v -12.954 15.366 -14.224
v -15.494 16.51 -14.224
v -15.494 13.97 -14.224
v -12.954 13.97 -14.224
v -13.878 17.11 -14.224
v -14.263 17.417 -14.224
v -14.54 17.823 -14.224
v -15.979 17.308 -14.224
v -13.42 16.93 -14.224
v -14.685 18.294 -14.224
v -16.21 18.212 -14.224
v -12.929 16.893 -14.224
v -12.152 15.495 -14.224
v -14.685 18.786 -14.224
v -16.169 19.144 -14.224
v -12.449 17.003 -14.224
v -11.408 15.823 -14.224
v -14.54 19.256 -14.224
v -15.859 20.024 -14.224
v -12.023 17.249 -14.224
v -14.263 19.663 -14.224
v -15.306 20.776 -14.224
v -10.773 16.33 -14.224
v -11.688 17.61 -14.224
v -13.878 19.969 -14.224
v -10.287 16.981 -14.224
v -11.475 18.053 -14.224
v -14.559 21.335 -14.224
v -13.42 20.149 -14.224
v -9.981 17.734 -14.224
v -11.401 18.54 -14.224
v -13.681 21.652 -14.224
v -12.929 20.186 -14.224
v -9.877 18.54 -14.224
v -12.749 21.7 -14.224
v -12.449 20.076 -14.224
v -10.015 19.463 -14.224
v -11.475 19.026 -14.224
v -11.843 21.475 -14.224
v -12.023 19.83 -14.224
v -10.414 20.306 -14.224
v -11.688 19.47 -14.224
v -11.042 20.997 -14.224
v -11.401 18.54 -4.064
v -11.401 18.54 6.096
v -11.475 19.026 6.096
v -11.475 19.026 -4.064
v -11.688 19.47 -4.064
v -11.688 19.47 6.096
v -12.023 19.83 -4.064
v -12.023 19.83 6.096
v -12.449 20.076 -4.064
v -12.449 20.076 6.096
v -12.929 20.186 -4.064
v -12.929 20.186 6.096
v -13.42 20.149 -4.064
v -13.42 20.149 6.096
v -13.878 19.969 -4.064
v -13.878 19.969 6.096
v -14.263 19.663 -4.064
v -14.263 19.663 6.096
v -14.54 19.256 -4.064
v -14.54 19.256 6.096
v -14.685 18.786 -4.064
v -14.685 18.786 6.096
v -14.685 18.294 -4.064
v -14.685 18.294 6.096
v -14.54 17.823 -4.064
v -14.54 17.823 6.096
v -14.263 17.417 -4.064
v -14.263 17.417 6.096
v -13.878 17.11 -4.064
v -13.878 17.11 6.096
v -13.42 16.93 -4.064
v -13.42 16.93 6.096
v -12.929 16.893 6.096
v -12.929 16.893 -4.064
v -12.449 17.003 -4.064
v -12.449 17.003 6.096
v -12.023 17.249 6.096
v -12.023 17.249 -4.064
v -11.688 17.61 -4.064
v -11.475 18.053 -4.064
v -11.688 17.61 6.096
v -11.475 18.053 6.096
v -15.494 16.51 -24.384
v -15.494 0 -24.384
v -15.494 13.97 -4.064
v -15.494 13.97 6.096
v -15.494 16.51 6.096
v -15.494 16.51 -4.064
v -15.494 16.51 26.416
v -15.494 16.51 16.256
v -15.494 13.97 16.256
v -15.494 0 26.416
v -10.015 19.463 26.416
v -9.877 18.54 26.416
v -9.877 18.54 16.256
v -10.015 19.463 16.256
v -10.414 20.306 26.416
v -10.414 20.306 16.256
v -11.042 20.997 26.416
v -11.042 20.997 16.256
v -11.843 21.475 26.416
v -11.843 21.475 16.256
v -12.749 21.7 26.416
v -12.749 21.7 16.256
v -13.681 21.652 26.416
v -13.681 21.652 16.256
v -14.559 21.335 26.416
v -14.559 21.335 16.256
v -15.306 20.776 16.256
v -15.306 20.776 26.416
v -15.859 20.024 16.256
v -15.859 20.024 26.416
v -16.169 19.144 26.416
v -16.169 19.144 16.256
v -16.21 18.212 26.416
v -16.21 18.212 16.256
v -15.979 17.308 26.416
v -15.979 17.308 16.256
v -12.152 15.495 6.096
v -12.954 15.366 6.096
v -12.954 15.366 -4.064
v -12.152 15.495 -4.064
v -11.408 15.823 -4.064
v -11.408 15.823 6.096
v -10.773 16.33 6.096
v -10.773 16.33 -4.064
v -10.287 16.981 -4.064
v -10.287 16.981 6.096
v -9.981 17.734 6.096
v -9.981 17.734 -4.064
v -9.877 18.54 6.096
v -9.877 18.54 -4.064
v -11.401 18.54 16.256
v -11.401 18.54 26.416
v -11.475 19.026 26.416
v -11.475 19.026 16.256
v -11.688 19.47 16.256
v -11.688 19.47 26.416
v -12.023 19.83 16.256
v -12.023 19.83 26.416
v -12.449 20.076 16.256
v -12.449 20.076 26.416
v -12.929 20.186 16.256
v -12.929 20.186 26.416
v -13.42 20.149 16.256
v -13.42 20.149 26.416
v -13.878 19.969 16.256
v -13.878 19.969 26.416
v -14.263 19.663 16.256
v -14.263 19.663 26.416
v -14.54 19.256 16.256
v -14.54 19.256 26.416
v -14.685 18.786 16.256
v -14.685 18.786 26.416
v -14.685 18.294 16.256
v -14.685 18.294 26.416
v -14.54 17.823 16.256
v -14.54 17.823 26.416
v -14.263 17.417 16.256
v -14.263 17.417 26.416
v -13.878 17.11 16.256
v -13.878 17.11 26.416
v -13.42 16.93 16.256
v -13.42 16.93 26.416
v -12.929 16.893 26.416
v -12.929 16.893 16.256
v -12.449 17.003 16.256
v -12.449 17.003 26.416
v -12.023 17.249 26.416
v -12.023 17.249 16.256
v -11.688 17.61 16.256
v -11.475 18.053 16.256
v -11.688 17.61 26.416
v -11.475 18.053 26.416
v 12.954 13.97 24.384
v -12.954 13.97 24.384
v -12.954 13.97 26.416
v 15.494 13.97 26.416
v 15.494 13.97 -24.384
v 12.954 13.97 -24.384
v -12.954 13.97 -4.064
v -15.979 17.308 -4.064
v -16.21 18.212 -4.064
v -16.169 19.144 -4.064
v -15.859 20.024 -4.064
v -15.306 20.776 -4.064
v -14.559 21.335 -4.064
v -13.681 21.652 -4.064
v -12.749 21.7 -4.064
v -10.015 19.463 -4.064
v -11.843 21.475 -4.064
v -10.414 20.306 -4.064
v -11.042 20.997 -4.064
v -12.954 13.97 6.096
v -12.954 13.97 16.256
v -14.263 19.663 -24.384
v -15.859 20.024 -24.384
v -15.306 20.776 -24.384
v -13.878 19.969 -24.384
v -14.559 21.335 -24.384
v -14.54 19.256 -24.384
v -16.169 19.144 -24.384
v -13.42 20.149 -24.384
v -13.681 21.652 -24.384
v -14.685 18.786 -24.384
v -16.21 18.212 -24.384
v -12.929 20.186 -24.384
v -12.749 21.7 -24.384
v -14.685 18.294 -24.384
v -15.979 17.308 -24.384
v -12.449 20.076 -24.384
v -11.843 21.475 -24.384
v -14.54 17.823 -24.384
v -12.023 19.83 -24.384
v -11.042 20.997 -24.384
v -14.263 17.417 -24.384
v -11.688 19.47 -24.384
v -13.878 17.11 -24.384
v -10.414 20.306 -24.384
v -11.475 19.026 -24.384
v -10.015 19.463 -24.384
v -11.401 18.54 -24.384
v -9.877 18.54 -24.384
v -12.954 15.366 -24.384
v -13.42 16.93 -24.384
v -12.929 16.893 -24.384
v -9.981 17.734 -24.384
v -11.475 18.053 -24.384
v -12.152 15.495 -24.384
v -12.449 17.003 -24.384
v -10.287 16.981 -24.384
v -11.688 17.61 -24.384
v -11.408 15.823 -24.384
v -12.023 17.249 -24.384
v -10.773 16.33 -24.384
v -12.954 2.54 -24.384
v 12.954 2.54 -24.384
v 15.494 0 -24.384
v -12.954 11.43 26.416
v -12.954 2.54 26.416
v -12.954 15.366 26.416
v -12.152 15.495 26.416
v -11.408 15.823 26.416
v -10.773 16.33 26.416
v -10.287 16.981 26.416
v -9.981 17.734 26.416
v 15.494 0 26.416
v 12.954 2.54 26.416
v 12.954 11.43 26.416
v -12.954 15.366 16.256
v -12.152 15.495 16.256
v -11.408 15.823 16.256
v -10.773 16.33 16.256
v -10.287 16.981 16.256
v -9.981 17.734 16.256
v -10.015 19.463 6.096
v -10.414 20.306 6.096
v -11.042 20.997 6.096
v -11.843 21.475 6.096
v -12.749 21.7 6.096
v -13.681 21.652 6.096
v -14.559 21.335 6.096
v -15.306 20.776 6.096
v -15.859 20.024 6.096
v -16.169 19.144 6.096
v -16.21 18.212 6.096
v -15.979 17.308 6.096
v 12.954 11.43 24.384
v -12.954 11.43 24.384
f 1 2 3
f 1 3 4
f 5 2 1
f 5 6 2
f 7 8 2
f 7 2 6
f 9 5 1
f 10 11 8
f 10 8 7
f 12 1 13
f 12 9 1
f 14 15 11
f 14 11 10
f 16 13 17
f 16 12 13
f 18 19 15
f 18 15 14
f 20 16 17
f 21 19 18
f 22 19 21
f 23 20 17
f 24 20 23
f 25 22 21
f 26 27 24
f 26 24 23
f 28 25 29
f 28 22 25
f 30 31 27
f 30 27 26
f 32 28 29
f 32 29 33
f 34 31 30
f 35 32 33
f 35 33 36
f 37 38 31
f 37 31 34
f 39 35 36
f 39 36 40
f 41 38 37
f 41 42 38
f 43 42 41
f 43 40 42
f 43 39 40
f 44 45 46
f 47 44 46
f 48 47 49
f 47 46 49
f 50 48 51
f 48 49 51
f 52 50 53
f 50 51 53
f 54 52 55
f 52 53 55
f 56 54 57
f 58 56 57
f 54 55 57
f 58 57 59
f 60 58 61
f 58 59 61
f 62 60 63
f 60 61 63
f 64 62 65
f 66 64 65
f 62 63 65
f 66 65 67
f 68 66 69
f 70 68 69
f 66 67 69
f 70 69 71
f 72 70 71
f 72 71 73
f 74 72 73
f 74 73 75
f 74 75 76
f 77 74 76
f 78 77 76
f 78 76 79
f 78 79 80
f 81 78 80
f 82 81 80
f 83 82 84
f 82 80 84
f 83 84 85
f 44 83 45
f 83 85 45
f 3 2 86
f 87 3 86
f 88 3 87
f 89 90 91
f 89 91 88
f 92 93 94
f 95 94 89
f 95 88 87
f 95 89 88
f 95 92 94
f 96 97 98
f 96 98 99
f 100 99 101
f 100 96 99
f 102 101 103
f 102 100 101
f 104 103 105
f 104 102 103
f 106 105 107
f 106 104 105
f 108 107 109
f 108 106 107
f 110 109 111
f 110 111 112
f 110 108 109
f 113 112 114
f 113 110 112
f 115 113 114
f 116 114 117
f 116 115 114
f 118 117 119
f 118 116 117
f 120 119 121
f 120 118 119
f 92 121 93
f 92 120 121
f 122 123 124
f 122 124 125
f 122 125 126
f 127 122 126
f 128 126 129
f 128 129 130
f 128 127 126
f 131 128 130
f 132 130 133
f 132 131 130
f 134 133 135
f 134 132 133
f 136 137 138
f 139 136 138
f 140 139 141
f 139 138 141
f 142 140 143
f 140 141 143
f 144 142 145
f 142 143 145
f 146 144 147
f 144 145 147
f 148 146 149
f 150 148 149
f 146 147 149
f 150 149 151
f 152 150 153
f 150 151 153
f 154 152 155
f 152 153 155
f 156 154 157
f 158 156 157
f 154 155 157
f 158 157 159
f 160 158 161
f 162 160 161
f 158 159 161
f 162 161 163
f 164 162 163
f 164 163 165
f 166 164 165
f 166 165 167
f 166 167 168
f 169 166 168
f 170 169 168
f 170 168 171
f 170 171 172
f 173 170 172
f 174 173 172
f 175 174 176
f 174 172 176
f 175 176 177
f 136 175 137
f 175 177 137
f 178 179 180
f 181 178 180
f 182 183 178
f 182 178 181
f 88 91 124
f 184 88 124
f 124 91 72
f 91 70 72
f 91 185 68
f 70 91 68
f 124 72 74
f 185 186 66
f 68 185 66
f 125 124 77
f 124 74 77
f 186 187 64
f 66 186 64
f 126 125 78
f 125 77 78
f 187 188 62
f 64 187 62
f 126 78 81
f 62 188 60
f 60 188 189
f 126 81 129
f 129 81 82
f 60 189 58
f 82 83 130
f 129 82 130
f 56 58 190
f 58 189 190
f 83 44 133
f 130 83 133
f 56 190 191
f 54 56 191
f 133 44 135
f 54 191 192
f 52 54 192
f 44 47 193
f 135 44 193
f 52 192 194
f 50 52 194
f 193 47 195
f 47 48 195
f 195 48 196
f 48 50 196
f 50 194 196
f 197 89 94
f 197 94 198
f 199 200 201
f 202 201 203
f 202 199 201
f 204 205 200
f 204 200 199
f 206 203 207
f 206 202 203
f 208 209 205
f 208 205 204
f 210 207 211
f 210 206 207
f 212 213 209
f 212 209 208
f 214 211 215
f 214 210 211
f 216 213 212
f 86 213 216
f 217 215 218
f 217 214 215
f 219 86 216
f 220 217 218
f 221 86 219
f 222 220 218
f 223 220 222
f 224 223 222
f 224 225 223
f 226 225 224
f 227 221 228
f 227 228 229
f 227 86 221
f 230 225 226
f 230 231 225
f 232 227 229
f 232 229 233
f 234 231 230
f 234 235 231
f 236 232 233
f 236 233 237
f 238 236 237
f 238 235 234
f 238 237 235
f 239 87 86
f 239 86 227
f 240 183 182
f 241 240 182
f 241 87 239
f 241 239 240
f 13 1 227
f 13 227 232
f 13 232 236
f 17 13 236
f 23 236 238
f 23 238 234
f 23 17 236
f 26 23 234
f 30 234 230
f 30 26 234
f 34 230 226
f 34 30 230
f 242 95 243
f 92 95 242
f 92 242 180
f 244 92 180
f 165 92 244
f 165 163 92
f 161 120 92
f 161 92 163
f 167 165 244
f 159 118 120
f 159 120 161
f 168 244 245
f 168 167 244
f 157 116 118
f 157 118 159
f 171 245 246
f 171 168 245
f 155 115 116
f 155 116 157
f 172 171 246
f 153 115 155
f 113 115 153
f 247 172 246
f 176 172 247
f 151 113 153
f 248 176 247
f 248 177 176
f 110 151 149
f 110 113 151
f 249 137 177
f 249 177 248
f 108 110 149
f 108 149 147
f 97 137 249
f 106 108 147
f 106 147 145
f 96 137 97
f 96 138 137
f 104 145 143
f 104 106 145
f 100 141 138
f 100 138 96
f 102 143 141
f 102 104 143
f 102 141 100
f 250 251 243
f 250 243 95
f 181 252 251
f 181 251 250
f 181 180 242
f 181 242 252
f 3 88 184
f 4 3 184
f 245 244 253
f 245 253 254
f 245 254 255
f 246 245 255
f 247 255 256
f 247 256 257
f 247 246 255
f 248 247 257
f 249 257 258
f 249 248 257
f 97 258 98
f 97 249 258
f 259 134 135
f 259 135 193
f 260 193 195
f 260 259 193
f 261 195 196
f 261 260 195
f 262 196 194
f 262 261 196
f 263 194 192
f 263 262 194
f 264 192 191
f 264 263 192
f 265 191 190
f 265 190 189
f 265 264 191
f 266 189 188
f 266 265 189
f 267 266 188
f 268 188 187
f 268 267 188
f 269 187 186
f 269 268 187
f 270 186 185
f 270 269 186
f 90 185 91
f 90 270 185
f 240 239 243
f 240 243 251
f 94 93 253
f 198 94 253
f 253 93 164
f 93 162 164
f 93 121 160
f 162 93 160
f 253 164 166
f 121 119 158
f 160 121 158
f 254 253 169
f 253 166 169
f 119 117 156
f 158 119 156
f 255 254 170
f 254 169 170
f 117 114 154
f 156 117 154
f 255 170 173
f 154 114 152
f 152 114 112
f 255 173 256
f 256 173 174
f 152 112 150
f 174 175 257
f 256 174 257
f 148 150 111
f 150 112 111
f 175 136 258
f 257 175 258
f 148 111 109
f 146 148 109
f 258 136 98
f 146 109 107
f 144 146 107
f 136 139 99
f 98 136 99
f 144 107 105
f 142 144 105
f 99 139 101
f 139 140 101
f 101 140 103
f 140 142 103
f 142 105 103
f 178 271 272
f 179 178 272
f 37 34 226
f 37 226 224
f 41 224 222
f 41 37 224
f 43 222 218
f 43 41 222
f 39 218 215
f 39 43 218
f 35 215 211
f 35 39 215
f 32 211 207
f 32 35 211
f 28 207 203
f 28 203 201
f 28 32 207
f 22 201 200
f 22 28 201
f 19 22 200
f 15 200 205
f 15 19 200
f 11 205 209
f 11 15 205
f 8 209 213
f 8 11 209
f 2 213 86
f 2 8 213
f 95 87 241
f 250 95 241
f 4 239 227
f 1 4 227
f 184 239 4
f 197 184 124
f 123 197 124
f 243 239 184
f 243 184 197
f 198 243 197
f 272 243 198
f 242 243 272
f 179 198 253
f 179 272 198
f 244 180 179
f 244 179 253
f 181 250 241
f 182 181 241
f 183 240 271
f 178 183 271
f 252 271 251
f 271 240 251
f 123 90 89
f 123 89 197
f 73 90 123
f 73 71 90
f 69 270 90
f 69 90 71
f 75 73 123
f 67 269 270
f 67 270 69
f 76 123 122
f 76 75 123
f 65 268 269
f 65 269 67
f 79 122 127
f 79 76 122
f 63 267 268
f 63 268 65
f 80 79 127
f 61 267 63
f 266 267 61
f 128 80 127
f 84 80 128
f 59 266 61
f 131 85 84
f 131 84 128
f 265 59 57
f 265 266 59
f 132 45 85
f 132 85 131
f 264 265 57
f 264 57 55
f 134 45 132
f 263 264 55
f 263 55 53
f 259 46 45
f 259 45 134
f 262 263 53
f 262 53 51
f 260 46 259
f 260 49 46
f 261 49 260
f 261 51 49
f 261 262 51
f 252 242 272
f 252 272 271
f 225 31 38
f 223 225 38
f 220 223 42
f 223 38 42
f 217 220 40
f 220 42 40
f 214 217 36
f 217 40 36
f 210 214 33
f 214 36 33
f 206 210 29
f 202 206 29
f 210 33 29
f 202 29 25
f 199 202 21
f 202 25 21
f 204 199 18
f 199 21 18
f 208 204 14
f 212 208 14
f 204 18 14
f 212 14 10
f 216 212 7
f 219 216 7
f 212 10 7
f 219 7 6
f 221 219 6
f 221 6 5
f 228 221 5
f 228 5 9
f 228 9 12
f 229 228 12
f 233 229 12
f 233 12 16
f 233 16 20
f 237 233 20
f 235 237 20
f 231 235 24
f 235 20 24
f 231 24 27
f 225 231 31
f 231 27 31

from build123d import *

# Parameters (mm, degrees)
BATTERY_WALL_DEPTH  = 13.97
SKETCH1_4_W         = 25.908
SKETCH1_4_H         = 48.768
BATTERY_BASE_DEPTH  = 2.54
SKETCH3_W           = 25.908
SKETCH3_H           = 8.89
BATTERY_GAP_DEPTH   = 2.54
SKETCH4_R           = 1.651
BATTERY_HINGE_DEPTH = 10.16
LPATTERN1_COUNT     = 3
LPATTERN1_PITCH     = 20.32


with BuildPart() as part:
    # Sketch1 → battery-wall (new body)
    with BuildSketch(Plane(origin=(0, 0, 0), x_dir=(1, 0, 0), z_dir=(0, 1, 0))):
        Polygon((-12.954, -24.384), (-12.954, 24.384), (-15.494, 24.384), (-15.494, -26.416), (15.494, -26.416), (15.494, 24.384), (12.954, 24.384), (12.954, -24.384), align=None)
    extrude(amount=BATTERY_WALL_DEPTH)

    # Sketch1<4> → battery-base (add)
    with BuildSketch(Plane(origin=(0, 0, 0), x_dir=(1, 0, 0), z_dir=(0, 1, 0))):
        Rectangle(SKETCH1_4_W, SKETCH1_4_H)
    extrude(amount=BATTERY_BASE_DEPTH)

    # Sketch3 → battery-gap (cut)
    with BuildSketch(Plane.XY.offset(26.416)):
        with Locations((0, 6.985)):
            Rectangle(SKETCH3_W, SKETCH3_H)
    extrude(amount=-BATTERY_GAP_DEPTH, mode=Mode.SUBTRACT)

    # Sketch4 → battery-hinge (add)
    with BuildSketch(Plane.XY.offset(26.416)):
        with BuildLine():
            Line((-15.494, 16.51), (-15.494, 13.97))
            Line((-15.494, 13.97), (-12.954, 13.97))
            Line((-12.954, 13.97), (-12.954, 15.366140824))
            ThreePointArc((-12.954, 15.366140824), (-11.748702854, 21.434599078), (-15.494, 16.51))
        make_face()
        with Locations((-13.052425, 18.53961487)):
            Circle(SKETCH4_R, mode=Mode.SUBTRACT)
    battery_hinge = extrude(amount=-BATTERY_HINGE_DEPTH)

    # LPattern1: battery-hinge ×3
    with Locations(*[(0, 0, -i * LPATTERN1_PITCH) for i in range(1, LPATTERN1_COUNT)]):
        add(battery_hinge)


solid = part.part
